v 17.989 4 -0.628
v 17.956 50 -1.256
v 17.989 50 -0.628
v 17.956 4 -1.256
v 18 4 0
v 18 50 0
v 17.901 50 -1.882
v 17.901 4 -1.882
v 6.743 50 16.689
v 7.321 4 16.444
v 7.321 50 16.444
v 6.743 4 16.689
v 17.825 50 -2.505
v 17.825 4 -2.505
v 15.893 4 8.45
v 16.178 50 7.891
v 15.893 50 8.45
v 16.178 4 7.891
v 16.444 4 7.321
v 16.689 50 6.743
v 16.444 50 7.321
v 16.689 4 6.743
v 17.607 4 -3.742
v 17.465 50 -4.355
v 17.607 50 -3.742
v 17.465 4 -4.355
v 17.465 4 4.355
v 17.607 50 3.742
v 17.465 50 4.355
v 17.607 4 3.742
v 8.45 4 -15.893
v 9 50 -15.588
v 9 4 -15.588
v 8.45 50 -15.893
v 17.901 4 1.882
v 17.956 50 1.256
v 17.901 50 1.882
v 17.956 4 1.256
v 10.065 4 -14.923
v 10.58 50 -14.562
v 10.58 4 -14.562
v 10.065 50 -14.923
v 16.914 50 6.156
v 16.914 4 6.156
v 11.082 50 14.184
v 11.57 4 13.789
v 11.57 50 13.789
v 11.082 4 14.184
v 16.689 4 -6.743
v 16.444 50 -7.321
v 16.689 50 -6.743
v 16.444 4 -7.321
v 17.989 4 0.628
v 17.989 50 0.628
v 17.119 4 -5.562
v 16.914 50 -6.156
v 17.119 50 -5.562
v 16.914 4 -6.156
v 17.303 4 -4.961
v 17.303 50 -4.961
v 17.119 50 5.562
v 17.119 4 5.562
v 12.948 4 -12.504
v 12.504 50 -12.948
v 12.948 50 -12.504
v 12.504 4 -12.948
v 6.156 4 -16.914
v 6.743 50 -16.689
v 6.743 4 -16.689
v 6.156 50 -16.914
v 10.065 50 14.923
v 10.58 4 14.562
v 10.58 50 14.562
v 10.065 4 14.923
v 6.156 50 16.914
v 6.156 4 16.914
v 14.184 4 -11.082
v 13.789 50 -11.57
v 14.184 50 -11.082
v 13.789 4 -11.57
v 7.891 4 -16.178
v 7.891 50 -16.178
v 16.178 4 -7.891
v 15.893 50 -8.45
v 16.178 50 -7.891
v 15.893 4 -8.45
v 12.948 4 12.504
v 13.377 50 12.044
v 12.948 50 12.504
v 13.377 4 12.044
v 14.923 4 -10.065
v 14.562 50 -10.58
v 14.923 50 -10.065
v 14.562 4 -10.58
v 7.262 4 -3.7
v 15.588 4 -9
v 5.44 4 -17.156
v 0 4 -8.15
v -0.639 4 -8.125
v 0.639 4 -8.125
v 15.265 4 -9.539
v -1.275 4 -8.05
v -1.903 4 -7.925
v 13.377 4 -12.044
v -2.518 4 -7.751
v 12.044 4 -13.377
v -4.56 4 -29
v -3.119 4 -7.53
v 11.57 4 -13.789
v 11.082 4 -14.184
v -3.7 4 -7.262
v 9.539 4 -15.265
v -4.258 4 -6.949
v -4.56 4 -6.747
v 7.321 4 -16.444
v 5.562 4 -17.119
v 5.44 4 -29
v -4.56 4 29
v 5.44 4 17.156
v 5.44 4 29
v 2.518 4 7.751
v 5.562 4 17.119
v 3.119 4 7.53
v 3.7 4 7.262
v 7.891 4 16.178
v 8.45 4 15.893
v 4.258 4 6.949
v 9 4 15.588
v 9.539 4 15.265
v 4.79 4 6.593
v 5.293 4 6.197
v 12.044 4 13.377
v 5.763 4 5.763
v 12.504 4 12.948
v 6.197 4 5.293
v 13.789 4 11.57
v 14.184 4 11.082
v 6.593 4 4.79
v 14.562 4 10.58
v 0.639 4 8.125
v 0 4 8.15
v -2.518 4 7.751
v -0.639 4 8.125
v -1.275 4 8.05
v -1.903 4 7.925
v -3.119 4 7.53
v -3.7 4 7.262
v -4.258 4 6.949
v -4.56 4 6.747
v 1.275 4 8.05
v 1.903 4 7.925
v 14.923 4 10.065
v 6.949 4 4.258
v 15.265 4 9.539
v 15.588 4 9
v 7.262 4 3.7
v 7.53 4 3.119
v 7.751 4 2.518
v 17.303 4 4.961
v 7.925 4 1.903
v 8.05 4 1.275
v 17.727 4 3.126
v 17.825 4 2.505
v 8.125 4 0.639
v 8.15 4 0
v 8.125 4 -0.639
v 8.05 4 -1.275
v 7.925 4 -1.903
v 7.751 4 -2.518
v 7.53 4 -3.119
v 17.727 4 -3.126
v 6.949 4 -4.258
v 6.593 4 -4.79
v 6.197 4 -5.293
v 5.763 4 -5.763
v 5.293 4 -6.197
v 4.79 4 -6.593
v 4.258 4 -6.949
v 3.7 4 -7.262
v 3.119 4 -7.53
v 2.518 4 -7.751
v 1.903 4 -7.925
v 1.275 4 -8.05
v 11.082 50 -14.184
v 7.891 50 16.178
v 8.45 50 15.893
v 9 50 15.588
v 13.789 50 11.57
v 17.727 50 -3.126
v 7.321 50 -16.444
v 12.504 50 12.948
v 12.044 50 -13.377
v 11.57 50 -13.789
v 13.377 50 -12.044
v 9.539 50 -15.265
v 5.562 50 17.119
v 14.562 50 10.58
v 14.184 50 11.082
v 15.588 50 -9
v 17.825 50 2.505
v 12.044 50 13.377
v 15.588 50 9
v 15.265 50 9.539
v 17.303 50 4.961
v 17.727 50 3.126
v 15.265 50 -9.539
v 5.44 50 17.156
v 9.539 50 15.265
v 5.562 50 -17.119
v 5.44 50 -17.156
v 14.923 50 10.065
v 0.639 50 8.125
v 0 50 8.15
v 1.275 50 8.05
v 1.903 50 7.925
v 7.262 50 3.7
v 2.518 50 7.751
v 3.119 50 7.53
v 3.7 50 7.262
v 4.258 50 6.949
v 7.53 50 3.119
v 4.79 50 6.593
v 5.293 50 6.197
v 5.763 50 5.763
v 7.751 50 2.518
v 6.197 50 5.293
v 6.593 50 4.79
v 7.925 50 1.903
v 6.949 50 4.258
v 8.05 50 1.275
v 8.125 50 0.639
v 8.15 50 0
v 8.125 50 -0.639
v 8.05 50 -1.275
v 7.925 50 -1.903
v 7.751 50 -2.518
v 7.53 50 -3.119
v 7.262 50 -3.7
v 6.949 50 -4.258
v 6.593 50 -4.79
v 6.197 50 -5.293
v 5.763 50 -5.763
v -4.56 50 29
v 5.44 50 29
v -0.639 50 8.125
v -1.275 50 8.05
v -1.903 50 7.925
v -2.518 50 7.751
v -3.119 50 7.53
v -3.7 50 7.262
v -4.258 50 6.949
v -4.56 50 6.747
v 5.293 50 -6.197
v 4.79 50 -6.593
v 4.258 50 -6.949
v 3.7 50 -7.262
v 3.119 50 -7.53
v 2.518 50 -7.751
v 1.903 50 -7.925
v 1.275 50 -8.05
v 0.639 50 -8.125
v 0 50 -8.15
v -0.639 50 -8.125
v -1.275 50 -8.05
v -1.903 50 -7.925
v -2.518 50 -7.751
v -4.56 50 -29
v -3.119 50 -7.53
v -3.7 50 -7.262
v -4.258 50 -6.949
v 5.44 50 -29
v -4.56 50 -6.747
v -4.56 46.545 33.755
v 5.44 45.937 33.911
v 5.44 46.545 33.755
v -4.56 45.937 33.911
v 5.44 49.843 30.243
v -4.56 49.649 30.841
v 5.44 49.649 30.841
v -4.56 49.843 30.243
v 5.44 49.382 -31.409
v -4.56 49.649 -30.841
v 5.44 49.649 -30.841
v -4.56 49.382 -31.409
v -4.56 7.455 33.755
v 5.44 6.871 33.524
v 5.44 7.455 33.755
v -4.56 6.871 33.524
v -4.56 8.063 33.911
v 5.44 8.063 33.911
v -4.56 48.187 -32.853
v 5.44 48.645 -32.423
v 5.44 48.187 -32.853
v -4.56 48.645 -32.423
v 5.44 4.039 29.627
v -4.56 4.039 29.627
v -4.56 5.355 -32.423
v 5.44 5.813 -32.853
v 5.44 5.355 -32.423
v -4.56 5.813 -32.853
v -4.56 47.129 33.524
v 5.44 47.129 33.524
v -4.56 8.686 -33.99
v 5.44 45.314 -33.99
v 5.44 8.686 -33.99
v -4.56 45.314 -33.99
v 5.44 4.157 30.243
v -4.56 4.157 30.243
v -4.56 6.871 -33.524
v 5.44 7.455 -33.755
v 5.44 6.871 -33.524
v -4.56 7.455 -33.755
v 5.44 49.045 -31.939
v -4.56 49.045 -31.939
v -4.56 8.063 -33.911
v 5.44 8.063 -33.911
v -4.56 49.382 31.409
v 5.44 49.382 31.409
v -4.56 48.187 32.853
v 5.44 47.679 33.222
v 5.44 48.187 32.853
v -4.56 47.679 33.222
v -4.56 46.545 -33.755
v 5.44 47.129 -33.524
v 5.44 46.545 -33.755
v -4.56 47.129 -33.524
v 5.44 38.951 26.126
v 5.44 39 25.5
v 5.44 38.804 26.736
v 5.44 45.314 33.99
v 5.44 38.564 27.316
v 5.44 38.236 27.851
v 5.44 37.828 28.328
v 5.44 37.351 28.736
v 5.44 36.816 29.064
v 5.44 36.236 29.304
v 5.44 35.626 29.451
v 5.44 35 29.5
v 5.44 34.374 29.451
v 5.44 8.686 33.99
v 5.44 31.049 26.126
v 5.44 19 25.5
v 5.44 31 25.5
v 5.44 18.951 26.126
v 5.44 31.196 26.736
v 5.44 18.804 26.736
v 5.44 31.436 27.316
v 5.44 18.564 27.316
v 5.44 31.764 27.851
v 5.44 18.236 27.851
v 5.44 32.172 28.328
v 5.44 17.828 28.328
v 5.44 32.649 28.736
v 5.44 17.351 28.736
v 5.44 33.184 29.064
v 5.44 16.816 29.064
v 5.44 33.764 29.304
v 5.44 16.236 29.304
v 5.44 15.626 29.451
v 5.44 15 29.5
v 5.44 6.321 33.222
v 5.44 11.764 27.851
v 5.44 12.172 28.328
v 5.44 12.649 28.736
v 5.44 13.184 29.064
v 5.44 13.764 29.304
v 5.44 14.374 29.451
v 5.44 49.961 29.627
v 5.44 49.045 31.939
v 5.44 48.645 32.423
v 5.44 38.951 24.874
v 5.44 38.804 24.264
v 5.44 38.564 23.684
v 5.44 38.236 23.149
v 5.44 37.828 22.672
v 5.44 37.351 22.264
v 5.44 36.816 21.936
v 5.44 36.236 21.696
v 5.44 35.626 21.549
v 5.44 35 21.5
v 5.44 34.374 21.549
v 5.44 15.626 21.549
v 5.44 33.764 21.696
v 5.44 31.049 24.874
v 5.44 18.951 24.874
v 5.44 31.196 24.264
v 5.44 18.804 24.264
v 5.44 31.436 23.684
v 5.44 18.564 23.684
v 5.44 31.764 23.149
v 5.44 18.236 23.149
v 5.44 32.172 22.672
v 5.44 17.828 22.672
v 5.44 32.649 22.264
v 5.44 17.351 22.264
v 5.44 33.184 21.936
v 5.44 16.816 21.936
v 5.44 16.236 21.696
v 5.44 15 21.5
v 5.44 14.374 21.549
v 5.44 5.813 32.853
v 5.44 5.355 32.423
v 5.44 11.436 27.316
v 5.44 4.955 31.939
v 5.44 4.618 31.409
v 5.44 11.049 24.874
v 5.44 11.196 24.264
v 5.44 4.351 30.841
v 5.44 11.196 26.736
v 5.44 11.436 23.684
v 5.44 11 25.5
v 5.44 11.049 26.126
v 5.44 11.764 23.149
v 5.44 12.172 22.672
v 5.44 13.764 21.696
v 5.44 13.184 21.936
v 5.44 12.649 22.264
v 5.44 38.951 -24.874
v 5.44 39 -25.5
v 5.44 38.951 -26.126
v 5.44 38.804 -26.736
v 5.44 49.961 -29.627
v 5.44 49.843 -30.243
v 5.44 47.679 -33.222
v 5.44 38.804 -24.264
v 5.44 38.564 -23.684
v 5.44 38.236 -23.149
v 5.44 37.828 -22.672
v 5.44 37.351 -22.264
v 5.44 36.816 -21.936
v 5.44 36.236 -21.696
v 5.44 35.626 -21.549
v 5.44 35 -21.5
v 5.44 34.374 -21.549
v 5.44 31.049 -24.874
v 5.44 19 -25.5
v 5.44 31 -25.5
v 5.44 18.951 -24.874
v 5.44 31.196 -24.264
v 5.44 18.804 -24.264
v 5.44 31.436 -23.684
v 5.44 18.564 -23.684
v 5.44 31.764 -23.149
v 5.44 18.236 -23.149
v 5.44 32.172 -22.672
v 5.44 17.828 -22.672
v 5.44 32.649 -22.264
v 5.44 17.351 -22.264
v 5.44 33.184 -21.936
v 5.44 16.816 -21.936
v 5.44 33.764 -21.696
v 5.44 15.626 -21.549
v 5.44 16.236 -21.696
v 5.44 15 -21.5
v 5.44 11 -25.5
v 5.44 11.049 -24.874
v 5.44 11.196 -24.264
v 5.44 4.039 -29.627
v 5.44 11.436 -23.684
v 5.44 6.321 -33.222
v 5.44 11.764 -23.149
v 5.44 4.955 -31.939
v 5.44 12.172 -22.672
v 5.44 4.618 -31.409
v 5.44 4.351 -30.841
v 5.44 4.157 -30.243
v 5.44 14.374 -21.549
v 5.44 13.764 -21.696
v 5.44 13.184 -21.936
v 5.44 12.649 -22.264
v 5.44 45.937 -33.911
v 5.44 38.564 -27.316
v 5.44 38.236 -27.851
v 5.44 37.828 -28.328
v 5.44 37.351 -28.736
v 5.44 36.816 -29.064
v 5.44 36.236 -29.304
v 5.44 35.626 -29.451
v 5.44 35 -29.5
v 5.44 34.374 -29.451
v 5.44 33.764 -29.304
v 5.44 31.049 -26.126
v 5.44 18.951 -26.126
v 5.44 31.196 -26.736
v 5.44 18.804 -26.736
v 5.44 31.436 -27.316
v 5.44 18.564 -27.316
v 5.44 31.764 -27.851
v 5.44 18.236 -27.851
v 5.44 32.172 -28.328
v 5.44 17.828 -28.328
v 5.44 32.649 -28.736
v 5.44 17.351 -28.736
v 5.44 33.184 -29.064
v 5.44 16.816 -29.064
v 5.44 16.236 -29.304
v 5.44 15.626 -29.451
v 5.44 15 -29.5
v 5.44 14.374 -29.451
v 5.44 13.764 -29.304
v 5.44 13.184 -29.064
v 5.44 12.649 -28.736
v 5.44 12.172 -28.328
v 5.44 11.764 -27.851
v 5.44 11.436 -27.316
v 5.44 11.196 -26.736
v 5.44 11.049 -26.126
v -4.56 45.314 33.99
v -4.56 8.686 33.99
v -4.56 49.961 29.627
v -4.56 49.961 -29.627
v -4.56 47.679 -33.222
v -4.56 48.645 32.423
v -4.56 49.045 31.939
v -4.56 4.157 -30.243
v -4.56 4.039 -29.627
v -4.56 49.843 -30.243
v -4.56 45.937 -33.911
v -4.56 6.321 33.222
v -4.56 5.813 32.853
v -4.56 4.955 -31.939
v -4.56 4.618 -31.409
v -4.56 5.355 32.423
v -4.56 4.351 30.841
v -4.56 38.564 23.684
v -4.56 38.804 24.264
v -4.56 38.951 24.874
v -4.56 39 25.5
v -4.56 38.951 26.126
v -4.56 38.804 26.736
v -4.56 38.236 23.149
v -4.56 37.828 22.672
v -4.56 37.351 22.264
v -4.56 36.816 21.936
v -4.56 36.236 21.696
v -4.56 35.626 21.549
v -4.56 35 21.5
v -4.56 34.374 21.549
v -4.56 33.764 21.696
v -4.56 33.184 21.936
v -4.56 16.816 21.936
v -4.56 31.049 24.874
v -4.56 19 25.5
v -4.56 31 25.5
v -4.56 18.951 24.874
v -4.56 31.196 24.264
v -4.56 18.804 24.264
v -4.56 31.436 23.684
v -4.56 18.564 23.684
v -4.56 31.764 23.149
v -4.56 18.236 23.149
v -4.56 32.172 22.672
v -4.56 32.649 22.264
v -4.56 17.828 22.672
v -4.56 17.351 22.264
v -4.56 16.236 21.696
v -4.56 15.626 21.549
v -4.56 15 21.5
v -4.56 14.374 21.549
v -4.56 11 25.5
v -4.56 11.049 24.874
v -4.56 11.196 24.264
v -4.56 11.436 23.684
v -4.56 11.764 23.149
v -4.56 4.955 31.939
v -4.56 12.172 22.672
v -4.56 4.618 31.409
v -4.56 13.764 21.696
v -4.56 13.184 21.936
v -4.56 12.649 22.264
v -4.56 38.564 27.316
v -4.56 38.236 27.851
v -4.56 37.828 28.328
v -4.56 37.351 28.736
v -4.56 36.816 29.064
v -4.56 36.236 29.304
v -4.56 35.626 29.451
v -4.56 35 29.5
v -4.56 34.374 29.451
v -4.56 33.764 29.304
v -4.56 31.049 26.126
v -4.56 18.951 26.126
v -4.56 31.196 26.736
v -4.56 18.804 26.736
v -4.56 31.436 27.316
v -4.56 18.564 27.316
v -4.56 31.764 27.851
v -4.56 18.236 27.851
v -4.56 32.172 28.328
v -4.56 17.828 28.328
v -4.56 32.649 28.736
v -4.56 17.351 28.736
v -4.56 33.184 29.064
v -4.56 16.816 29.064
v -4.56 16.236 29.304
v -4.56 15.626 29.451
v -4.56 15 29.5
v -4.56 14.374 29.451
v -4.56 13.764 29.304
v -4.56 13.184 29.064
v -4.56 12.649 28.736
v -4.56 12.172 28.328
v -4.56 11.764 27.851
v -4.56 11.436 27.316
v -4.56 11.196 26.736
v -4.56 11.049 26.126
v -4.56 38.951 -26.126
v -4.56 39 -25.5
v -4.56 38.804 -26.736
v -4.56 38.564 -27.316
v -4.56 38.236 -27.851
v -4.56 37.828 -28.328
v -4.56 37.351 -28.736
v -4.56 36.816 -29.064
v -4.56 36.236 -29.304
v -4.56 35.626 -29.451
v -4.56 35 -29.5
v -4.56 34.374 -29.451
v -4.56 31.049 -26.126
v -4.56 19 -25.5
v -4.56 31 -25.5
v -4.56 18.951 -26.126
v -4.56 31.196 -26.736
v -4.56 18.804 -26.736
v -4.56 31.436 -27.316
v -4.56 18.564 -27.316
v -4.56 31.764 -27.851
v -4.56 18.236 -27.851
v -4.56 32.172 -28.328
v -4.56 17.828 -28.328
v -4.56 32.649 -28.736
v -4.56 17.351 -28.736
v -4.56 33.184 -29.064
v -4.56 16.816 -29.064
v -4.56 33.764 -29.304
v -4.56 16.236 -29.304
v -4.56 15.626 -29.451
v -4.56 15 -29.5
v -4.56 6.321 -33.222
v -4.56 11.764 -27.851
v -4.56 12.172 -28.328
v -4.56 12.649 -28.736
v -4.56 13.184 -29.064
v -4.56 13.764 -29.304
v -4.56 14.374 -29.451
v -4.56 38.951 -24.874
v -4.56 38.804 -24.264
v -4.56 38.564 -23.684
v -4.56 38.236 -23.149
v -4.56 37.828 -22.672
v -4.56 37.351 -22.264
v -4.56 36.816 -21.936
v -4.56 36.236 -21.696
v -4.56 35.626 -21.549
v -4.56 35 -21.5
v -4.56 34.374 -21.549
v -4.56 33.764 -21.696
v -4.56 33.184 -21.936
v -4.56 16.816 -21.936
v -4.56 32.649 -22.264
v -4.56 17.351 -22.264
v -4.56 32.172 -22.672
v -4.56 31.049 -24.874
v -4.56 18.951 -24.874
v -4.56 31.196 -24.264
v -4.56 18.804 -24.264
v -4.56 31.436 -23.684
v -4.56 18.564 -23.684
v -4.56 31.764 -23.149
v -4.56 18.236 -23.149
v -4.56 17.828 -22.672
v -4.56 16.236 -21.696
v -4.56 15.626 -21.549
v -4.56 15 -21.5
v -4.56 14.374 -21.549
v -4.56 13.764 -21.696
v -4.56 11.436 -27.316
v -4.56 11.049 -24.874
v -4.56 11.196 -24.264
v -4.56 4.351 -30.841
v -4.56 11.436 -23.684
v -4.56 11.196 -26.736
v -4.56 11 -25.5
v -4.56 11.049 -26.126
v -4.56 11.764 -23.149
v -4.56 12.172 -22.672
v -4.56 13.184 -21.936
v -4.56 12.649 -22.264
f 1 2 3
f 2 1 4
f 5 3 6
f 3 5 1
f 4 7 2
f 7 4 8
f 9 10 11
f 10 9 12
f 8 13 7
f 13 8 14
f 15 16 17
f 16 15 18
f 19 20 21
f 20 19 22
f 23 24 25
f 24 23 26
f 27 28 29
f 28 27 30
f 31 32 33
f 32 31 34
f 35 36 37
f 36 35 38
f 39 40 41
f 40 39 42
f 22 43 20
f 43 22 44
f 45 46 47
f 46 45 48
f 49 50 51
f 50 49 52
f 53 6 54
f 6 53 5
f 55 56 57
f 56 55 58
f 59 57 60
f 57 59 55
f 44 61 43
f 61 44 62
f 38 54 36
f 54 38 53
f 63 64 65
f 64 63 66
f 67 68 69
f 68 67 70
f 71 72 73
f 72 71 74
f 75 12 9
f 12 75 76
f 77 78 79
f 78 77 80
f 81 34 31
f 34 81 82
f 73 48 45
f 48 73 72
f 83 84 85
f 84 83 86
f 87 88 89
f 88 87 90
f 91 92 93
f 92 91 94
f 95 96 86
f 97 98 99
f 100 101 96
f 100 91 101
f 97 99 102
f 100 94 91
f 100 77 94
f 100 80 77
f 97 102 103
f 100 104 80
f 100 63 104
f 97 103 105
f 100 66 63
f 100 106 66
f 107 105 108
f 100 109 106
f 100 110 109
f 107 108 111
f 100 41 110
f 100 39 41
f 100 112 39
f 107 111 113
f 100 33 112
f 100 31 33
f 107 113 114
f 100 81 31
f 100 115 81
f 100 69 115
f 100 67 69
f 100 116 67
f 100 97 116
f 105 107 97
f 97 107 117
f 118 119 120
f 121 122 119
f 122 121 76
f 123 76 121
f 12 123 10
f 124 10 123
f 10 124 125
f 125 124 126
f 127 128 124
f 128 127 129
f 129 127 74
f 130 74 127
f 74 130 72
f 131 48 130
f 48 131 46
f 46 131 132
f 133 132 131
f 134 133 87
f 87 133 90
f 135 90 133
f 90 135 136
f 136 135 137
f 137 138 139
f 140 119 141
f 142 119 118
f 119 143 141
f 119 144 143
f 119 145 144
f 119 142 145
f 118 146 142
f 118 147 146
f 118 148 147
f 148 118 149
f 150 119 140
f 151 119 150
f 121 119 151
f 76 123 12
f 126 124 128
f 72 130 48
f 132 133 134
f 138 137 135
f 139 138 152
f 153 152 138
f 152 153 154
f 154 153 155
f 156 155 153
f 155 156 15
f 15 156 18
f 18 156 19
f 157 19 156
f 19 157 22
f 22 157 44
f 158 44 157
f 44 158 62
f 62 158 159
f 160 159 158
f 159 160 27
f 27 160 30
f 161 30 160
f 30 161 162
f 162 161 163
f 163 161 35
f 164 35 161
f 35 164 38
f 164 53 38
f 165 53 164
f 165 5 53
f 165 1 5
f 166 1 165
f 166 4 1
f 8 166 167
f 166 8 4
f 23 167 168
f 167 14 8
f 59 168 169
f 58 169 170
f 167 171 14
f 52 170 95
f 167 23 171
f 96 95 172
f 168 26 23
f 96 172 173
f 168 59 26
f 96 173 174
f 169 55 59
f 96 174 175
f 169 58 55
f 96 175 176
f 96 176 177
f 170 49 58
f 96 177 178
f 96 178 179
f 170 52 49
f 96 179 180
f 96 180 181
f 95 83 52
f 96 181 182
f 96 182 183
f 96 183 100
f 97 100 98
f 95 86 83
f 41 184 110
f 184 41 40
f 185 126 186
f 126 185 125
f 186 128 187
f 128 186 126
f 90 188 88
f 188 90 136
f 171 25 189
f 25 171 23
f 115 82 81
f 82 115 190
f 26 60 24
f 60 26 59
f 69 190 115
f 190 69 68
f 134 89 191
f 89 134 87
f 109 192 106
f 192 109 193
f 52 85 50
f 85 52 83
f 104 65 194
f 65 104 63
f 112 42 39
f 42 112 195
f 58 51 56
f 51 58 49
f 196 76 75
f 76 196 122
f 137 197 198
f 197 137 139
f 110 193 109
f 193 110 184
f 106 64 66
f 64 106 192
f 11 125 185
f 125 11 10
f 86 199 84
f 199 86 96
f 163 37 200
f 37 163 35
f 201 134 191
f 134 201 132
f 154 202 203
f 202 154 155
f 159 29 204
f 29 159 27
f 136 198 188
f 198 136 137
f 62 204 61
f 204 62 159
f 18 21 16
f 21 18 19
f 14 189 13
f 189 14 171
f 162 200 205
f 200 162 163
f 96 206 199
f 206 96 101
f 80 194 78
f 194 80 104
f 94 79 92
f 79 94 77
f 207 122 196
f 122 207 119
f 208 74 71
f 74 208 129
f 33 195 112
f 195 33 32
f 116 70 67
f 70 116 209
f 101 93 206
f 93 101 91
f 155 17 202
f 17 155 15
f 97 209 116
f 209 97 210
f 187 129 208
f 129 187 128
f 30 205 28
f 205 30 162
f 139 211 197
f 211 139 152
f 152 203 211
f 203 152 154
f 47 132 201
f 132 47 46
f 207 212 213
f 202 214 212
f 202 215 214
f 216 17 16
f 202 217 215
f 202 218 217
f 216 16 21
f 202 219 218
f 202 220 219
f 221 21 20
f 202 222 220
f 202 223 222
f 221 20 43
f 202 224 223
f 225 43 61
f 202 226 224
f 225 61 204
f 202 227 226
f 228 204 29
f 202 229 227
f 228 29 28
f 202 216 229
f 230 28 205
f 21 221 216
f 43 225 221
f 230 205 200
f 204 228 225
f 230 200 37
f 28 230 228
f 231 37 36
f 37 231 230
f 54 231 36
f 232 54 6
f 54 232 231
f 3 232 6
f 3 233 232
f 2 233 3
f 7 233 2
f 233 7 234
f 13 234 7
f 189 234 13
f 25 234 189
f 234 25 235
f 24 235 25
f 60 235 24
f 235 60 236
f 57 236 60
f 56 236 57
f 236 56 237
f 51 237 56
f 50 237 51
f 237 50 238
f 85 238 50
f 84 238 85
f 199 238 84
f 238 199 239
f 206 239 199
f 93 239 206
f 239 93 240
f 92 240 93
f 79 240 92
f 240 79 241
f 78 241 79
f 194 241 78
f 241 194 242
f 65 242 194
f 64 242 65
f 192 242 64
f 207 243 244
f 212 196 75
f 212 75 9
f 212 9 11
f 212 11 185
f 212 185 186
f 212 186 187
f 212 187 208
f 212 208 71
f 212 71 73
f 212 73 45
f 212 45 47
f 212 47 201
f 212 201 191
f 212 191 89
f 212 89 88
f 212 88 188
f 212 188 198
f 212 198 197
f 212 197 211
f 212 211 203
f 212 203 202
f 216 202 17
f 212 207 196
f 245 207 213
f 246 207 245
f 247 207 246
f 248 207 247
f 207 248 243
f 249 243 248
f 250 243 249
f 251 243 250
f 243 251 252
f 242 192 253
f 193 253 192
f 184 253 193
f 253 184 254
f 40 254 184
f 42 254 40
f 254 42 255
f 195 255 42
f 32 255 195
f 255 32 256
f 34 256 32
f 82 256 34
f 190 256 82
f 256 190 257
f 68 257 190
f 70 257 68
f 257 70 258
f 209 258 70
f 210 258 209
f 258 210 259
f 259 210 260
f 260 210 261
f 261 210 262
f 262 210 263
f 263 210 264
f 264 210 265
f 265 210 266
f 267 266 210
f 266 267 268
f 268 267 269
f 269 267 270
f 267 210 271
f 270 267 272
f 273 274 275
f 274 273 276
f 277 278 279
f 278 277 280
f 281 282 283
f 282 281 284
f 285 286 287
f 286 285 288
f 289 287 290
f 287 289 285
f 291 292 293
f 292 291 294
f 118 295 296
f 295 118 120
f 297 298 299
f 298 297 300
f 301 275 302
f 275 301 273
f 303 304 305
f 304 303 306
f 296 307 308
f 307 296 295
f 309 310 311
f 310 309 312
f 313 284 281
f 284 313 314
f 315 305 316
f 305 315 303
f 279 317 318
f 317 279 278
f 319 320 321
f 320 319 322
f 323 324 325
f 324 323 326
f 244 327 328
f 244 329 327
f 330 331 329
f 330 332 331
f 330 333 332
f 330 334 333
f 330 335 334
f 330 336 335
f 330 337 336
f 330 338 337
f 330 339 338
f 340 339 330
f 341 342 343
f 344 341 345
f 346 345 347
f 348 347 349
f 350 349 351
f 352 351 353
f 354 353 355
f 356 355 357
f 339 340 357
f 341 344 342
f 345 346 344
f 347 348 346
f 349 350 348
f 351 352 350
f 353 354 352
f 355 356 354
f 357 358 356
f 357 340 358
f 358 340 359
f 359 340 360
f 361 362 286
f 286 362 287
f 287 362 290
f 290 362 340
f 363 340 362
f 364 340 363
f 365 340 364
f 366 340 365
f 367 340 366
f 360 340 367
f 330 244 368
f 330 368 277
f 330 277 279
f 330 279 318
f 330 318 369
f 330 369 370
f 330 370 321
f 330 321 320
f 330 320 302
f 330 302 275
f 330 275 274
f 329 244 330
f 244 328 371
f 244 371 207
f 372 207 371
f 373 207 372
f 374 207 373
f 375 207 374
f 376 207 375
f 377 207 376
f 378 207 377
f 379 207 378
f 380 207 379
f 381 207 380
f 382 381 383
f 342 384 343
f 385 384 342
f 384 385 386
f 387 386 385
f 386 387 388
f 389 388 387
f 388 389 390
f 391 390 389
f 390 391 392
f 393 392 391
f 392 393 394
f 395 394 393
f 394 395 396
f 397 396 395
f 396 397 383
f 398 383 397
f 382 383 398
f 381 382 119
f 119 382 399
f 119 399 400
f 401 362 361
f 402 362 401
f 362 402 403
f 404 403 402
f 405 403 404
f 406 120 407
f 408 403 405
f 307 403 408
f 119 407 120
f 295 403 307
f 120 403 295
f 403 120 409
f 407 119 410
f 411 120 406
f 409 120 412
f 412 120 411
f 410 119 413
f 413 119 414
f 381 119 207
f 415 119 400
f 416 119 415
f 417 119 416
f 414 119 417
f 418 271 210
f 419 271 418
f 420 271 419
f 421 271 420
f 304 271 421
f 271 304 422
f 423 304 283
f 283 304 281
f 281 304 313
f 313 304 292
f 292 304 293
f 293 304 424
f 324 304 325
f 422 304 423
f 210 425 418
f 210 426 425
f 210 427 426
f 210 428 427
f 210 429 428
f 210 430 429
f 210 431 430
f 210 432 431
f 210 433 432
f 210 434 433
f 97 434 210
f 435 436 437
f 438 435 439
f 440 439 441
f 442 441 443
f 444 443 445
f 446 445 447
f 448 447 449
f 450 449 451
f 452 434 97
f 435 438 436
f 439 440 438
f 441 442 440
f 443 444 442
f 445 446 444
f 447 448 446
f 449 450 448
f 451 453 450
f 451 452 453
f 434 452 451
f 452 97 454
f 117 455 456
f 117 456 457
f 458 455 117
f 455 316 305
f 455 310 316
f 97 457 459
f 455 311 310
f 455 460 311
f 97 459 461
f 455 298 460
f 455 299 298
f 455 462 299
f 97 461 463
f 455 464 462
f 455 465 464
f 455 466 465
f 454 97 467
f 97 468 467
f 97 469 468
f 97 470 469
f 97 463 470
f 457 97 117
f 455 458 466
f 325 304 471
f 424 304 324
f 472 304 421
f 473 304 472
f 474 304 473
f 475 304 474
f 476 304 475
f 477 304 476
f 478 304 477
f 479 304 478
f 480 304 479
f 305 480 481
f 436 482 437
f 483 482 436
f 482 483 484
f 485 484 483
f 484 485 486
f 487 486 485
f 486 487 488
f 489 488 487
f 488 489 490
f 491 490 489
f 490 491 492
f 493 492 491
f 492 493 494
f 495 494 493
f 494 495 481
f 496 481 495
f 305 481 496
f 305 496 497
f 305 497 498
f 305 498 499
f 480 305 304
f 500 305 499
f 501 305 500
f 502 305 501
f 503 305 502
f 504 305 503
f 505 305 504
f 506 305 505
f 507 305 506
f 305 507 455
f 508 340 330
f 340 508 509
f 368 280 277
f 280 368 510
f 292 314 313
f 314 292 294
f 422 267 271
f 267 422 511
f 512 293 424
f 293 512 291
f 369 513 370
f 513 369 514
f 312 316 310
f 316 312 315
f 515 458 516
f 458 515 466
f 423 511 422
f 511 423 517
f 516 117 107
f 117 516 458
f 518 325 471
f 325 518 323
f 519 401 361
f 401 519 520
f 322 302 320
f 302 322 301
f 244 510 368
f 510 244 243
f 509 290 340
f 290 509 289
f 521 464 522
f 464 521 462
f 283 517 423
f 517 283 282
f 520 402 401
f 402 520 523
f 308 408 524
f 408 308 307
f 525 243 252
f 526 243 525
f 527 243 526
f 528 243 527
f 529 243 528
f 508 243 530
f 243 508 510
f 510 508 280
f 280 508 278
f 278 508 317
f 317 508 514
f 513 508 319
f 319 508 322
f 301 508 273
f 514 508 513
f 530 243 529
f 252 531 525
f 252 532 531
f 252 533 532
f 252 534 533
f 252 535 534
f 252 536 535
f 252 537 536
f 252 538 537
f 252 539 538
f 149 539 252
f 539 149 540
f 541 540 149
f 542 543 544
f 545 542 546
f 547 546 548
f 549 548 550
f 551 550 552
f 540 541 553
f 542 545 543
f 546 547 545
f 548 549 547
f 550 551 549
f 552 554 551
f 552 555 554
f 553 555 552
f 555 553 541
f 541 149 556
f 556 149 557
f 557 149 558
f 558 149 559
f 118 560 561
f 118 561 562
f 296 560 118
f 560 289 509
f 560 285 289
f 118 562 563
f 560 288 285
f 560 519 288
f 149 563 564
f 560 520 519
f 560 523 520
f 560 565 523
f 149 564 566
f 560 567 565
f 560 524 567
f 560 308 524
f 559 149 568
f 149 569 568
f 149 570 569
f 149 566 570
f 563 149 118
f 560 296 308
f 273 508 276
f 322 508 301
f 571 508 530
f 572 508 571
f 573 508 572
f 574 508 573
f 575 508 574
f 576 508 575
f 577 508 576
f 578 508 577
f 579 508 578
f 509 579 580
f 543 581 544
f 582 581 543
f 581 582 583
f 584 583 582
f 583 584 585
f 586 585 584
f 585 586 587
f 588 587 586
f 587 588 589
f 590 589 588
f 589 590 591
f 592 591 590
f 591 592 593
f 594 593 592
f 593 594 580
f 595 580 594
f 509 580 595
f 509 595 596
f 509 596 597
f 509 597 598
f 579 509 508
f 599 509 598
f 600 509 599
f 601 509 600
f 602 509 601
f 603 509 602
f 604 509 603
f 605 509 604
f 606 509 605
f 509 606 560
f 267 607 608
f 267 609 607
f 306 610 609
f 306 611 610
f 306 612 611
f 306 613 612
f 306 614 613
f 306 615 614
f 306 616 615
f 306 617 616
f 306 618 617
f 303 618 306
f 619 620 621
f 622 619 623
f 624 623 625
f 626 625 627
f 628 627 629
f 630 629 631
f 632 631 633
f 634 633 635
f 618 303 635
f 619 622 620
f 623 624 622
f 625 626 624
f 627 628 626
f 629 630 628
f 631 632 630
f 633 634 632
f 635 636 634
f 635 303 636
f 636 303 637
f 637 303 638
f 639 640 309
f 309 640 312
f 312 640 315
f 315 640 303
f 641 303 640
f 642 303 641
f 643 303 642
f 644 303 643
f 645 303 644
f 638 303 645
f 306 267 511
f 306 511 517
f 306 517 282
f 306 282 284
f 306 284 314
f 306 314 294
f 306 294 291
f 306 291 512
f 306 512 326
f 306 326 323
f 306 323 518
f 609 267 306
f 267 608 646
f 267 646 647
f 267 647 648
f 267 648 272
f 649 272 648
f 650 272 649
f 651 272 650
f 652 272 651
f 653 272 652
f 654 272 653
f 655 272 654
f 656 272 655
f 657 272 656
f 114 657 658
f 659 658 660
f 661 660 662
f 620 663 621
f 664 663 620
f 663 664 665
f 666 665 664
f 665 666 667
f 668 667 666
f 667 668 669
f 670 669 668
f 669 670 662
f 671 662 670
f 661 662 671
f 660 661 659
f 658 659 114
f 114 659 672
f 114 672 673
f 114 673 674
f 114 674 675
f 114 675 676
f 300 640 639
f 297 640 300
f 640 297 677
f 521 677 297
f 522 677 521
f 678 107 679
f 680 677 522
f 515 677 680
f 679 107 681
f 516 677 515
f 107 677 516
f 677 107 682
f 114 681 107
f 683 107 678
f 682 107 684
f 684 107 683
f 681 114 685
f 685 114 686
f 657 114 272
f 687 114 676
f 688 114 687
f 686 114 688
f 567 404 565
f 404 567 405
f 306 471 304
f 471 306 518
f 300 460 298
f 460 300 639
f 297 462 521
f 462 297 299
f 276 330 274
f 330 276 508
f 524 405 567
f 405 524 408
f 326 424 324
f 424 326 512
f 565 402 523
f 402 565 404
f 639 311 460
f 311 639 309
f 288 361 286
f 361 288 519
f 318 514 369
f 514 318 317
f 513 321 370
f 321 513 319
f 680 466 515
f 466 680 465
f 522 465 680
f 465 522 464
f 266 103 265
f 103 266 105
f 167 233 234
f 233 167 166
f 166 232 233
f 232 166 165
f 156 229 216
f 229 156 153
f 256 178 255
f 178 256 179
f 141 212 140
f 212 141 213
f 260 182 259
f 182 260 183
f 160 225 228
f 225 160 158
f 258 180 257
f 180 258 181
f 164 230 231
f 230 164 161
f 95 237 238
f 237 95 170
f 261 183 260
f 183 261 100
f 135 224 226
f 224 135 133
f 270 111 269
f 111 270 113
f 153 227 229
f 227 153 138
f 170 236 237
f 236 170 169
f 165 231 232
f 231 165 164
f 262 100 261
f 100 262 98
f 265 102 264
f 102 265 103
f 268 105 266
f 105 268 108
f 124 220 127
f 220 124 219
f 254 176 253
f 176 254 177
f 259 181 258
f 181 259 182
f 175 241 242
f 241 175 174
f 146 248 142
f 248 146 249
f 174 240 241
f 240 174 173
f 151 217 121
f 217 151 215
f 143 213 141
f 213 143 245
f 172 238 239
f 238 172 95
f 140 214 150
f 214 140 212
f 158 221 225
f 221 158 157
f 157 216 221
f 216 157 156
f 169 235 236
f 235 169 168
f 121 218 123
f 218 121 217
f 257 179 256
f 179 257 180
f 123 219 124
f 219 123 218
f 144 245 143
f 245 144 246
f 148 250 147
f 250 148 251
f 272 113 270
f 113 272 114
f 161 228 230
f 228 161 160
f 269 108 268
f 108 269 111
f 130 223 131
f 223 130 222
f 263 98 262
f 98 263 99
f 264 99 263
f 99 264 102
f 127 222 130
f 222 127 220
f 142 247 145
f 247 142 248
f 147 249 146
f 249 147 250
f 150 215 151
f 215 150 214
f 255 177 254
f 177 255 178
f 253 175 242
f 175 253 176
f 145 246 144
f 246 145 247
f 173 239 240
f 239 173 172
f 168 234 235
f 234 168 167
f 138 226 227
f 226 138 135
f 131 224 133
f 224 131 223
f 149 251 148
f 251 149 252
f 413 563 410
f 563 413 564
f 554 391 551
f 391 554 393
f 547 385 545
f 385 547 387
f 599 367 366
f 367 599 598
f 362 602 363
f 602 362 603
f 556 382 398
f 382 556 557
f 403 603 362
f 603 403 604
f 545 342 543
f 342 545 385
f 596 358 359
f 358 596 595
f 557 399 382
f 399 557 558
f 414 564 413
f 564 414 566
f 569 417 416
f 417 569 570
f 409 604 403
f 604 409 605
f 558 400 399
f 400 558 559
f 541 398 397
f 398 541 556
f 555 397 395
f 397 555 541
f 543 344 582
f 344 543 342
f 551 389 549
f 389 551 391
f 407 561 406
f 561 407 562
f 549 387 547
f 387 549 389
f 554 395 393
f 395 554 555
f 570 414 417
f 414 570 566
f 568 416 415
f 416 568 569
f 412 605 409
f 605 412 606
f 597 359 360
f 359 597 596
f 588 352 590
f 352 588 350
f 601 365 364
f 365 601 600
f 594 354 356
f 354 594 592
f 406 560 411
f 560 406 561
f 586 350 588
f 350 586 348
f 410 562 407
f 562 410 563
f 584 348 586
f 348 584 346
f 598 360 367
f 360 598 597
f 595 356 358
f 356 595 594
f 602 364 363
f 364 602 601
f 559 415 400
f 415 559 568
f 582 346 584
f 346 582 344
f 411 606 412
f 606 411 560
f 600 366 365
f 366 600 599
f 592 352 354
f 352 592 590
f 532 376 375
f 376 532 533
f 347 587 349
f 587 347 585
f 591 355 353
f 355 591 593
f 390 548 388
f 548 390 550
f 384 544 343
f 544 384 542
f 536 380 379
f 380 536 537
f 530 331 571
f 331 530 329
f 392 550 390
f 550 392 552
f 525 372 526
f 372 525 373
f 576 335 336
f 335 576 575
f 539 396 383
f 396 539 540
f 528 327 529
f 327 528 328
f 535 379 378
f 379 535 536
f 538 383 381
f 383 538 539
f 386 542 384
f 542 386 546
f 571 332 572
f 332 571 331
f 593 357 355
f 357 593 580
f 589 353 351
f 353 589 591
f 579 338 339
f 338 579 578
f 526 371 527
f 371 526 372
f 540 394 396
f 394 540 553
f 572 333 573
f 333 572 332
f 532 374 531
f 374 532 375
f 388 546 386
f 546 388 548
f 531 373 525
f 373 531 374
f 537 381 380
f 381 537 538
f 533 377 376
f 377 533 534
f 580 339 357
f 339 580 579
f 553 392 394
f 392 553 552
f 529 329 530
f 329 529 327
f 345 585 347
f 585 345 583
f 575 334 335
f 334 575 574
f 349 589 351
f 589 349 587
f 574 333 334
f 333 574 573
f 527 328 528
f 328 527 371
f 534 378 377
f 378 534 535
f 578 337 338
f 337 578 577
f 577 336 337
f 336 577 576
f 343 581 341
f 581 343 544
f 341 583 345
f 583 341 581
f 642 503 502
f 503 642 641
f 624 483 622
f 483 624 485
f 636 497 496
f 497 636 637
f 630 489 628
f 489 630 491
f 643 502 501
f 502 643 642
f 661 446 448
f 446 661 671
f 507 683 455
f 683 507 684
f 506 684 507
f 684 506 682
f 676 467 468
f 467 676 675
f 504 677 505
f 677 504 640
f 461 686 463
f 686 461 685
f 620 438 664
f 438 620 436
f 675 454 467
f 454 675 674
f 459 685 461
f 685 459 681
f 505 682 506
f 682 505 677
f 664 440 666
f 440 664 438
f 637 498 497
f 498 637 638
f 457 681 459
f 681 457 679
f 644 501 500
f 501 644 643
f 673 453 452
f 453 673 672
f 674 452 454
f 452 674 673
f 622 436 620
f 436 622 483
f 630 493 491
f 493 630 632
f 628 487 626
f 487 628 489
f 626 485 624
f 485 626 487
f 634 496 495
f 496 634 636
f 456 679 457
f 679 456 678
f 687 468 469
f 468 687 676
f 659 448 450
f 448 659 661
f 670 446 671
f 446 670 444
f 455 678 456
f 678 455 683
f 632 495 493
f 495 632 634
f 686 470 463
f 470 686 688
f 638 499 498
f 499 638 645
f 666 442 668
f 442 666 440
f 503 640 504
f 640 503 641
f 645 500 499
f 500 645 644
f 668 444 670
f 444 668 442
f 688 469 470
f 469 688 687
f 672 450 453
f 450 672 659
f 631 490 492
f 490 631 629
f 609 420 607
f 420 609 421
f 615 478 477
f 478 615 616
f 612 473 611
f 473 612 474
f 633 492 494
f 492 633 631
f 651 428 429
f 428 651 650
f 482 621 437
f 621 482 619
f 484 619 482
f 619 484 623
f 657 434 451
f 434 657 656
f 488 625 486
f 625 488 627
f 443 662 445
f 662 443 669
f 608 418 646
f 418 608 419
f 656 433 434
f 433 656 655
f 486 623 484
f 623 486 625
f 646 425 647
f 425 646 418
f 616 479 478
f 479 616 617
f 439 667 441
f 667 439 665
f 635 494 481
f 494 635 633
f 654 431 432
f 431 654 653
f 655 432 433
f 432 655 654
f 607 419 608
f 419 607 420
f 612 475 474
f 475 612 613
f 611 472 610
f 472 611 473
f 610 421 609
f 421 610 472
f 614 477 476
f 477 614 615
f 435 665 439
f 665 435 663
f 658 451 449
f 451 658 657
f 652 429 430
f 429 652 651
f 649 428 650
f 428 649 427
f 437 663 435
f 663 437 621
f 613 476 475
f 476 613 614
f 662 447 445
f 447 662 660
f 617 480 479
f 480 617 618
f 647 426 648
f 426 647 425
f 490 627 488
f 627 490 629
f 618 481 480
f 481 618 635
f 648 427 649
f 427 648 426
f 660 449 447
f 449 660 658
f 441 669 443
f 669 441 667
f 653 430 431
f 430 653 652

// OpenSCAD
// file: Open_RALF_wheel_fix.scad
q      =  5;


use <Open_RALF_utils.scad>

play    =  0.3;

fix_ra  =  3.0;

axis_di = 16.0;
axis_le = 52.0;
feet_le = 40.0;
feet_wi = 40.0;


fix_th  = 10;
fix_di  = axis_di + 2 * fix_th;
fix_le  = axis_le - 6;
fix_wi  = fix_di  + 16 * 2;
fix_dy  = 4;

ax_fix();

module ax_fix() color([0.99,0.7,0.1,1]){
    difference() {
        union() {
            rotate([-90,0,0]) translate([0,0,fix_dy]) cylinder(d=fix_di , h=fix_le , $fn= fix_di*q);
            translate([-5.56+1+fix_th/2,23+fix_dy,0])  rotate([90,0,90]) srcube([fix_le,fix_wi,fix_th],5);
        }
        rotate([-90,0,0]) cylinder(d=axis_di+play, h=axis_le, $fn=axis_di*q);
        translate([-40-5.56+1,fix_dy-1,-fix_wi/2-1])  cube([40,fix_le+6,fix_wi+2]);
        rotate([0,90,0]) translate([-3*fix_wi/8,2+fix_le/2-10,-50]) cylinder(d=8, h=100, $fn=8*q);
        rotate([0,90,0]) translate([-3*fix_wi/8,2+fix_le/2+10,-50]) cylinder(d=8, h=100, $fn=8*q);
        rotate([0,90,0]) translate([ 3*fix_wi/8,2+fix_le/2-10,-50]) cylinder(d=8, h=100, $fn=8*q);
        rotate([0,90,0]) translate([ 3*fix_wi/8,2+fix_le/2+10,-50]) cylinder(d=8, h=100, $fn=8*q);
    }
}


module ax_fix_old() color([0.99,0.7,0.1,1]){
    translate([ (axis_le+5)/2, feet_wi/2,-axis_di*1.25]) difference() {
        rcube([axis_le+5, axis_di*2.5, axis_di*2.5], fix_ra);
        translate([-50,-50,-50]) cube([100,50,100]);
        translate([-(axis_le+5)/2-1.5, 0,0   ]) rotate([0,90,0]) cylinder(d=axis_di+play,h=axis_le,$fn=axis_di*q);
        translate([-15, 0,-axis_di*1.25]) cylinder(d= 8, h=16,$fn=8*q);
        translate([ 10, 0,-axis_di*1.25]) cylinder(d= 8, h=16,$fn=8*q);
        translate([-15, 0,-axis_di*1.25+7]) cylinder(d=12, h= 6,$fn=6  );
        translate([ 10, 0,-axis_di*1.25+7]) cylinder(d=12, h= 6,$fn=6  );
        translate([-(axis_le+5)/2+feet_le/2,0,0]) cylinder(d= 8, h=30,$fn=8*q);
        translate([-(axis_le+5)/2+feet_le/2,0,6]) cylinder(d=12, h=6,$fn=6);
    }
}
// file: Open_RALF_wheel.scad
// Aifred - FabLab Open Source Autonomous Troley
q      =  5;

use <Open_RALF_utils.scad>

play    =  0.3;

axis_di = 16.0;
axis_le = 52.0;
axis_lc = 45.0;
axis_hc =  3.0;
axis_ga =  3.0;


wheel();


module axis() color([0.6,0.6,0.65,1]) {
    translate([0,0,-axis_le]) difference() {
        cylinder(d=axis_di, h=axis_le+10, $fn=axis_di*q);
        translate([-10-axis_di/2+axis_hc,-10,2.9]) cube([10, 20, axis_lc]);
    }
}


module wheel() translate([0, 0,0]) rotate([90,0,0]){
    h1= 4.3;
    h2=46.0;
    h3=12.0;
    wt=44.5;
    axis();
    color([0.8,0.8,0.8,1]) {
    difference() {
        cylinder(d1=35,d2=46,h=h1,$fn=46*q);
        cylinder(d=25,h=100,center=true,$fn=25*q);
    }
    translate([0,0,h1   ]) cylinder(d=135,h=h2,$fn=135*q);
    translate([0,0,h1+h2]) cylinder(d1=128,d2=110,h=h3,$fn=135*q);
    }
    //translate([0, 0,h1+1+wt/2]) cylinder(d=175,h=1,$fn=135*q);
    //translate([0, 0,h1+1     ]) cylinder(d=152,h=1,$fn=135*q);
    color([0.2,0.2,0.2,1]) 
    difference()  {
        translate([0, 0,h1+1+wt/2]) rotate_extrude(convexity = 10, $fn = 100)
        translate([60.5, 0, 0]) circle(r = 27, $fn = 55*q);
        translate([-200,-200,h1+1+wt]) cube([400,400,100]);
        translate([-200,-200,h1+1-100]) cube([400,400,100]);
    }
    
}
// file: Open_RALF_BROR.scad
// Open RALF - FabLab Open Source Autonomous Troley
use <Open_RALF_utils.scad>

q      =  5;

T_lenght = 850;
T_widith = 550;
T_height = 880;
W_height = 100;

shelf_thk =  50;
hi_shelf1 = 230;
dz_shlf12 = 400; 
hi_shelf2 = hi_shelf1 + dz_shlf12;

feet_le = 40.0;
feet_wi = 40.0;
feet_di =  8.0;
feet_th =  1.9;
feet_hi = T_height - W_height;

wheel_d = 80;

BROR();


module BROR() {
    translate([-T_lenght/2, -T_widith/2, 0]) rotate([0,0,  0]) feet(feet_hi);
    translate([ T_lenght/2, -T_widith/2, 0]) rotate([0,0, 90]) feet(feet_hi);
    translate([ T_lenght/2,  T_widith/2, 0]) rotate([0,0,180]) feet(feet_hi);
    translate([-T_lenght/2,  T_widith/2, 0]) rotate([0,0,270]) feet(feet_hi);

    translate([          0,           0, 880      ]) top_shelf();
    translate([          0,           0, hi_shelf1]) shelf();
    translate([          0,           0, hi_shelf2]) shelf();
}

module feet(hi) {
    color([0.3,0.3,0.35,1]) translate([0, 0, W_height]) {
        cube([feet_le,feet_th,     hi]);
        cube([feet_th,feet_wi,     hi]);
        difference() {
            cube([feet_le,feet_wi,feet_th]);
            translate([feet_le/2,feet_wi/2, -1]) cylinder(d=feet_di, h=100, $fn=feet_di*q);
        }
    }
    color([0.1,0.1,0.1,1]) translate([feet_le/2+20,feet_wi/2, wheel_d/2]) BROR_Wheel();
}

module top_shelf() color([0.5,0.4,0.3,1]) {
    rcube([T_lenght, T_widith, 20], 5);
}

module shelf() color([0.32,0.32,0.35,1]) translate([0,0,shelf_thk/2]){
    difference() {
        rcube([T_lenght-feet_th*2, T_widith-feet_th*2, shelf_thk          ], 2);
         cube([T_lenght-feet_th*4, T_widith-feet_th*4, shelf_thk-feet_th*2], center=true);
        translate([0,0,-10]) cube([T_lenght-feet_th*4-20, T_widith-feet_th*4-20, shelf_thk], center=true);
    }
}

module BROR_Wheel() {
    rotate([90,0,0]) cylinder(d=wheel_d,h=20,$fn=wheel_d*q, center=true);

}
// file: Open_RALF_utils.scad
q      =  5;


module rcube(siz, rad) {            // rounded cube 
    xi = max(0.0001,siz[0]-2*rad);  // need to always ahve a value > 0
    yi = max(0.0001,siz[1]-2*rad);
    hi = max(0.0001,siz[2]-2*rad);
    minkowski() {
        cube([xi, yi, hi], center=true);
        sphere(r=rad, $fn=2*rad*q);
    }  
}


module srcube(siz, rad) {           // semi rounded cube
    xi = max(0.0001,siz[0]-2*rad);
    yi = max(0.0001,siz[1]-2*rad);
    hi =            siz[2]/2;
    minkowski() {
        cube([xi, yi, hi], center=true);
        cylinder(r=rad, h=hi, center=true, $fn=2*rad*q);
    }  
}
// main file
// Aifred - FabLab Open Source Autonomous Troley
q      =  10;



use <Open_RALF_utils.scad>
use <Open_RALF_BROR.scad>
use <Open_RALF_wheel.scad>
use <Open_RALF_wheel_fix.scad>


//BROR();

//translate([0,-210,175/2]) rotate([0, 90+plate_an,  0]) {
//    wheel();
//    ax_fix();
//}
//translate([0, 210,175/2]) rotate([0, 90-plate_an,180]) {
//    wheel();
    ax_fix();
//}
//ry_plate();

plate_th =  10;
plate_wi = 412;
plate_le = 470;
plate_an = -23;

module ry_plate() {
    translate([-40, 0,82]) rotate([0,plate_an,0]) 
        translate([0,-plate_wi/2,-plate_th/2]) cube([plate_le,plate_wi,plate_th]);

}
